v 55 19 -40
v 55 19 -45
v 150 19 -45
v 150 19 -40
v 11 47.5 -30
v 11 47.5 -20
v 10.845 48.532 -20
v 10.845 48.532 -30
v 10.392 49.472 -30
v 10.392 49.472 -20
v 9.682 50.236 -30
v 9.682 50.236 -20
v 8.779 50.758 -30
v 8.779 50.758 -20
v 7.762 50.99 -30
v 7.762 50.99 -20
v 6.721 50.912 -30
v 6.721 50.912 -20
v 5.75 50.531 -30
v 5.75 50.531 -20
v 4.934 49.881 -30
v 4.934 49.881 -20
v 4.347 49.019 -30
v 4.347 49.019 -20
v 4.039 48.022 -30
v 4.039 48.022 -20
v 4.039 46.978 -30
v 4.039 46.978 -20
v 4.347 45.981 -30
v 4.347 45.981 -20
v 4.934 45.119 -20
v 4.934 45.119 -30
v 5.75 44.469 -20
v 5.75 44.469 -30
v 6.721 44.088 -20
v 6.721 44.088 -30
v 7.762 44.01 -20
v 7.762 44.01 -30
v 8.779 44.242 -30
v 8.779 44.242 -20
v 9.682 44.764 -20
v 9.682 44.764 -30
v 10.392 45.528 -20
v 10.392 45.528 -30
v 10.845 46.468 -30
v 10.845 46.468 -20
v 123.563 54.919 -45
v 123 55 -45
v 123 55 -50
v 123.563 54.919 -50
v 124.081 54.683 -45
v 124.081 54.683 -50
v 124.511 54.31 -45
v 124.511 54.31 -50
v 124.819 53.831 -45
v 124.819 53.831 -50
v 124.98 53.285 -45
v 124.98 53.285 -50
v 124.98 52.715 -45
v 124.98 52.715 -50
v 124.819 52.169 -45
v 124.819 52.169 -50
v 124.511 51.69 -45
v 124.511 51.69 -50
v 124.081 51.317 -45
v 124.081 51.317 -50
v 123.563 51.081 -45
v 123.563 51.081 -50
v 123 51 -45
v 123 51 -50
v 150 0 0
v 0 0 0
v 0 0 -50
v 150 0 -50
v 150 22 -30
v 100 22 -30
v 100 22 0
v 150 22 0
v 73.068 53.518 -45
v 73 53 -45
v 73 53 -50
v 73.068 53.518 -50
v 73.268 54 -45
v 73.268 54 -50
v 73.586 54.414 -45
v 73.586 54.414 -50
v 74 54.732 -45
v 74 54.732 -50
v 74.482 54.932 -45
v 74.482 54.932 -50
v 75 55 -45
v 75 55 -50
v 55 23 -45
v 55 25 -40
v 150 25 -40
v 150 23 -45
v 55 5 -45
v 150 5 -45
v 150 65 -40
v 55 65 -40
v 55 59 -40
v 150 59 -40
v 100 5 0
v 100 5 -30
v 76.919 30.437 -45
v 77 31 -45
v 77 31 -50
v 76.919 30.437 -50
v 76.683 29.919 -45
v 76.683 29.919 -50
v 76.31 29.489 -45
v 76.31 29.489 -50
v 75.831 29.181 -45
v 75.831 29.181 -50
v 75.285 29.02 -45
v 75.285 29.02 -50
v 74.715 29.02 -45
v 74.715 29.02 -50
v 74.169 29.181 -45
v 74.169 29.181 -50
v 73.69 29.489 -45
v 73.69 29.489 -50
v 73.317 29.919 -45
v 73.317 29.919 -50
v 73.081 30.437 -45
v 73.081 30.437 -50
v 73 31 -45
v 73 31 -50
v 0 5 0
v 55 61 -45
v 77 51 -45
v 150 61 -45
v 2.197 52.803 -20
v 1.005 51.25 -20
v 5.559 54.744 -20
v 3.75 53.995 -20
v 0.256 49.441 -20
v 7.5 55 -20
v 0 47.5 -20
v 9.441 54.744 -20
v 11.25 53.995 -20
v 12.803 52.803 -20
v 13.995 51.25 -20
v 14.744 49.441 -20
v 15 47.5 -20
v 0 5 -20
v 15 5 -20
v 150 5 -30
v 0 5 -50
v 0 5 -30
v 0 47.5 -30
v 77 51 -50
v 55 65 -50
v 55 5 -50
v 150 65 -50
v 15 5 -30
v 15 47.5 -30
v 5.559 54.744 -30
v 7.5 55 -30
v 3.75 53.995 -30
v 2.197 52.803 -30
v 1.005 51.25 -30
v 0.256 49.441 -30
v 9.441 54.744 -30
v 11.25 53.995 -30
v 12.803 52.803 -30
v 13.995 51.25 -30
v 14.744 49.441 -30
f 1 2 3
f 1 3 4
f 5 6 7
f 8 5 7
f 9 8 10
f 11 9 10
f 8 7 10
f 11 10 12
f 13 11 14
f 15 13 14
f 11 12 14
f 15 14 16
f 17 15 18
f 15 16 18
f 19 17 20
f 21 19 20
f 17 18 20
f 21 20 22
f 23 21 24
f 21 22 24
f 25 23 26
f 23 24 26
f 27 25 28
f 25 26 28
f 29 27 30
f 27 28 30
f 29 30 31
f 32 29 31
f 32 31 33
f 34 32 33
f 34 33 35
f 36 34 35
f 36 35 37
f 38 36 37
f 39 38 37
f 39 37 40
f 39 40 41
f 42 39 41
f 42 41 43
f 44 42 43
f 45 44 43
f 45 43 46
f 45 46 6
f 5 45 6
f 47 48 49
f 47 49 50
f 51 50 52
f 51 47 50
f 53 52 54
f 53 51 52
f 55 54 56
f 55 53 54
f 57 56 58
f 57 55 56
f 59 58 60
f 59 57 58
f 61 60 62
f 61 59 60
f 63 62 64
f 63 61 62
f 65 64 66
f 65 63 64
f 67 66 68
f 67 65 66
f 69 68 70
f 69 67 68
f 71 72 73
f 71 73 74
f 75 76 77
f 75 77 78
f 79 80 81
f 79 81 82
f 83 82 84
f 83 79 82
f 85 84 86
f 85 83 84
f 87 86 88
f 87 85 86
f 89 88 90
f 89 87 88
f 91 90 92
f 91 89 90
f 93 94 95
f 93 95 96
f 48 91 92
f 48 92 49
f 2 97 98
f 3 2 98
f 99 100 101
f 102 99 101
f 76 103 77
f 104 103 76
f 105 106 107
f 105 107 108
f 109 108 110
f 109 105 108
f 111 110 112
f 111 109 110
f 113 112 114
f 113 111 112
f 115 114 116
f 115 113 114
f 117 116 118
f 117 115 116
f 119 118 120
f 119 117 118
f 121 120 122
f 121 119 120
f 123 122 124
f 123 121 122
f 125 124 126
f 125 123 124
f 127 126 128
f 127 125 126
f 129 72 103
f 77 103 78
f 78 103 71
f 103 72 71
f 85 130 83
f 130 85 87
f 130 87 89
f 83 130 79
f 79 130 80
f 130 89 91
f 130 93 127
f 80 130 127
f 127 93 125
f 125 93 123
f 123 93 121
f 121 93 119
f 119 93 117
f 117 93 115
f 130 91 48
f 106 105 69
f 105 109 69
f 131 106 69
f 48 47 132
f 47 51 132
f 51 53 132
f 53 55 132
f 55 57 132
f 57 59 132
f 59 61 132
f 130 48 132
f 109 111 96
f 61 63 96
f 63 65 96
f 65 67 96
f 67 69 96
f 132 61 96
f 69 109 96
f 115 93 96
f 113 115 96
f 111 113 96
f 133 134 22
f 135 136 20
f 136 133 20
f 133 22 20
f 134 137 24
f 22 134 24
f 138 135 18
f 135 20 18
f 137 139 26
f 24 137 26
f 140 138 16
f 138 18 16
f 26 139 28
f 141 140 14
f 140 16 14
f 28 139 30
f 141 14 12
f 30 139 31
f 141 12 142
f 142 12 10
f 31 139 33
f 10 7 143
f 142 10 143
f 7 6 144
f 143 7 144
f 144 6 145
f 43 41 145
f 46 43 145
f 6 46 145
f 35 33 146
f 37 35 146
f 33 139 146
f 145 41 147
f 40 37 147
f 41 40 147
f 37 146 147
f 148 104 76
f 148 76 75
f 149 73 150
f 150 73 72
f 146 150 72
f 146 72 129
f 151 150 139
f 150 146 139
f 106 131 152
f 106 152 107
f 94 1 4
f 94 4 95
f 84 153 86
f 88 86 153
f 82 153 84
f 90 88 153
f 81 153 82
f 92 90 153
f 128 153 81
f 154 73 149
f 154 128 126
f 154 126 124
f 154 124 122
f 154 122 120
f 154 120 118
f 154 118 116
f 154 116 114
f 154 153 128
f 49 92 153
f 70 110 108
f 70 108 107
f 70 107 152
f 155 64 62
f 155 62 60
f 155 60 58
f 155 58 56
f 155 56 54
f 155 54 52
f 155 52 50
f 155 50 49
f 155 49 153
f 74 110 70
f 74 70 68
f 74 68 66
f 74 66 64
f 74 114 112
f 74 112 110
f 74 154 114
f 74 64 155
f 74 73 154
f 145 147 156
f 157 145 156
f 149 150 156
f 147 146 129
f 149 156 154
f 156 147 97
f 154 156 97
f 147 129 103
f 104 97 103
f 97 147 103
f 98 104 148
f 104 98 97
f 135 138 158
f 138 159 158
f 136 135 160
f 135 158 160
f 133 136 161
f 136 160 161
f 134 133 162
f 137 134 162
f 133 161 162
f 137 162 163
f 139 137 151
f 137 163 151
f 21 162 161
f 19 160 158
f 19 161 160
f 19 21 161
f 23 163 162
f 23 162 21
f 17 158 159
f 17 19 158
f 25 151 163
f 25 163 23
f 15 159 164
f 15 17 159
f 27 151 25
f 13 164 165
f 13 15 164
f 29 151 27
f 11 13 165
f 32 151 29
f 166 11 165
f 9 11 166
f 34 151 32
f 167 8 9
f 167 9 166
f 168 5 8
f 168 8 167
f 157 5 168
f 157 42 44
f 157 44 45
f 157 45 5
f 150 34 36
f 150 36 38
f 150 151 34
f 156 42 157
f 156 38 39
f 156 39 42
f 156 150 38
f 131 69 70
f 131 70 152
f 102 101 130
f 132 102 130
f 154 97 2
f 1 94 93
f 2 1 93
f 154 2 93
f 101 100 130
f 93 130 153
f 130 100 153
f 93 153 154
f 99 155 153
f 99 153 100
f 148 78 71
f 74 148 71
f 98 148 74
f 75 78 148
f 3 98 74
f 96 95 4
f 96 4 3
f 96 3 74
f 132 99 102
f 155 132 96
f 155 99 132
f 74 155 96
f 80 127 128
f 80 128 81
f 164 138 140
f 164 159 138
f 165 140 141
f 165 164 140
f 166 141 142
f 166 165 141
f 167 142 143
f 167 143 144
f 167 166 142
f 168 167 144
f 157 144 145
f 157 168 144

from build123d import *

# Parameters (mm, degrees)
SKETCH1_W           = 150
SKETCH1_H           = 5
BOSS_EXTRUDE1_DEPTH = 50
SKETCH2_W           = 15
SKETCH2_H           = 10
BOSS_EXTRUDE2_DEPTH = 50
SKETCH3_W           = 95
SKETCH3_H           = 5
BOSS_EXTRUDE3_DEPTH = 60
SKETCH4_W           = 50
SKETCH4_H           = 30
BOSS_EXTRUDE4_DEPTH = 17
BOSS_EXTRUDE5_DEPTH = 95
FILLET1_R           = 7.5
SKETCH6_R           = 3.5
CUT_EXTRUDE1_DEPTH  = 30
CUT_EXTRUDE2_DEPTH  = 10
CUT_EXTRUDE3_DEPTH  = 10
SCALE1_SCALE        = 2
SCALE4_SCALE        = 0.5


with BuildPart() as part:
    # Sketch1 → Boss-Extrude1 (new body)
    with BuildSketch(Plane.XY):
        with Locations((75, 2.5)):
            Rectangle(SKETCH1_W, SKETCH1_H)
    extrude(amount=-BOSS_EXTRUDE1_DEPTH)

    # Sketch2 → Boss-Extrude2 (add)
    with BuildSketch(Plane(origin=(0, 5, 0), x_dir=(1, 0, 0), z_dir=(0, 1, 0))):
        with Locations((7.5, 25)):
            Rectangle(SKETCH2_W, SKETCH2_H)
    extrude(amount=BOSS_EXTRUDE2_DEPTH)

    # Sketch3 → Boss-Extrude3 (add)
    with BuildSketch(Plane(origin=(0, 5, 0), x_dir=(1, 0, 0), z_dir=(0, 1, 0))):
        with Locations((102.5, 47.5)):
            Rectangle(SKETCH3_W, SKETCH3_H)
    extrude(amount=BOSS_EXTRUDE3_DEPTH)

    # Sketch4 → Boss-Extrude4 (add)
    with BuildSketch(Plane(origin=(0, 5, 0), x_dir=(1, 0, 0), z_dir=(0, 1, 0))):
        with Locations((125, 15)):
            Rectangle(SKETCH4_W, SKETCH4_H)
    extrude(amount=BOSS_EXTRUDE4_DEPTH)

    # Sketch5 → Boss-Extrude5 (add)
    with BuildSketch(Plane(origin=(150, 0, 0), x_dir=(0, 0, -1), z_dir=(1, 0, 0))):
        Polygon((45, 65), (40, 65), (40, 59), (45, 61), align=None)
        Polygon((45, 19), (40, 19), (40, 25), (45, 23), align=None)
    extrude(amount=-BOSS_EXTRUDE5_DEPTH)

    # Fillet1
    fillet1_edges = [part.edges().sort_by_distance(p)[0] for p in [
        (15, 55, -25),
        (0, 55, -25),
    ]]
    fillet(fillet1_edges, radius=FILLET1_R - 0.0001)  # a hair under: the kernel refuses the full size

    # Sketch6 → Cut-Extrude1 (cut)
    with BuildSketch(Plane.XY.offset(-20)):
        with Locations((7.5, 47.5)):
            Circle(SKETCH6_R)
    extrude(amount=-CUT_EXTRUDE1_DEPTH, mode=Mode.SUBTRACT)

    # Sketch7 → Cut-Extrude2 (cut)
    with BuildSketch(Plane.XY.offset(-45)):
        with BuildLine():
            Line((75, 55), (123, 55))
            ThreePointArc((123, 55), (125, 53), (123, 51))
            Line((123, 51), (75, 51))
            ThreePointArc((75, 51), (73, 53), (75, 55))
        make_face()
    extrude(amount=-CUT_EXTRUDE2_DEPTH, mode=Mode.SUBTRACT)

    # Sketch8 → Cut-Extrude3 (cut)
    with BuildSketch(Plane.XY.offset(-45)):
        with BuildLine():
            Line((77, 53), (77, 31))
            ThreePointArc((77, 31), (75, 29), (73, 31))
            Line((73, 31), (73, 53))
            ThreePointArc((73, 53), (75, 55), (77, 53))
        make_face()
    extrude(amount=-CUT_EXTRUDE3_DEPTH, mode=Mode.SUBTRACT)


with BuildPart() as part_1:
    # Scale1: scaled about (91.729979694, 17.282886664, -29.286286863)
    add(part.part.scale(SCALE1_SCALE).moved(Location((-91.729979694, -17.282886664, 29.286286863))))


with BuildPart() as part_2:
    # Scale4: scaled about (91.729979694, 17.282886664, -29.286286864)
    add(part_1.part.scale(SCALE4_SCALE).moved(Location((45.864989847, 8.641443332, -14.643143432))))


solid = part_2.part
